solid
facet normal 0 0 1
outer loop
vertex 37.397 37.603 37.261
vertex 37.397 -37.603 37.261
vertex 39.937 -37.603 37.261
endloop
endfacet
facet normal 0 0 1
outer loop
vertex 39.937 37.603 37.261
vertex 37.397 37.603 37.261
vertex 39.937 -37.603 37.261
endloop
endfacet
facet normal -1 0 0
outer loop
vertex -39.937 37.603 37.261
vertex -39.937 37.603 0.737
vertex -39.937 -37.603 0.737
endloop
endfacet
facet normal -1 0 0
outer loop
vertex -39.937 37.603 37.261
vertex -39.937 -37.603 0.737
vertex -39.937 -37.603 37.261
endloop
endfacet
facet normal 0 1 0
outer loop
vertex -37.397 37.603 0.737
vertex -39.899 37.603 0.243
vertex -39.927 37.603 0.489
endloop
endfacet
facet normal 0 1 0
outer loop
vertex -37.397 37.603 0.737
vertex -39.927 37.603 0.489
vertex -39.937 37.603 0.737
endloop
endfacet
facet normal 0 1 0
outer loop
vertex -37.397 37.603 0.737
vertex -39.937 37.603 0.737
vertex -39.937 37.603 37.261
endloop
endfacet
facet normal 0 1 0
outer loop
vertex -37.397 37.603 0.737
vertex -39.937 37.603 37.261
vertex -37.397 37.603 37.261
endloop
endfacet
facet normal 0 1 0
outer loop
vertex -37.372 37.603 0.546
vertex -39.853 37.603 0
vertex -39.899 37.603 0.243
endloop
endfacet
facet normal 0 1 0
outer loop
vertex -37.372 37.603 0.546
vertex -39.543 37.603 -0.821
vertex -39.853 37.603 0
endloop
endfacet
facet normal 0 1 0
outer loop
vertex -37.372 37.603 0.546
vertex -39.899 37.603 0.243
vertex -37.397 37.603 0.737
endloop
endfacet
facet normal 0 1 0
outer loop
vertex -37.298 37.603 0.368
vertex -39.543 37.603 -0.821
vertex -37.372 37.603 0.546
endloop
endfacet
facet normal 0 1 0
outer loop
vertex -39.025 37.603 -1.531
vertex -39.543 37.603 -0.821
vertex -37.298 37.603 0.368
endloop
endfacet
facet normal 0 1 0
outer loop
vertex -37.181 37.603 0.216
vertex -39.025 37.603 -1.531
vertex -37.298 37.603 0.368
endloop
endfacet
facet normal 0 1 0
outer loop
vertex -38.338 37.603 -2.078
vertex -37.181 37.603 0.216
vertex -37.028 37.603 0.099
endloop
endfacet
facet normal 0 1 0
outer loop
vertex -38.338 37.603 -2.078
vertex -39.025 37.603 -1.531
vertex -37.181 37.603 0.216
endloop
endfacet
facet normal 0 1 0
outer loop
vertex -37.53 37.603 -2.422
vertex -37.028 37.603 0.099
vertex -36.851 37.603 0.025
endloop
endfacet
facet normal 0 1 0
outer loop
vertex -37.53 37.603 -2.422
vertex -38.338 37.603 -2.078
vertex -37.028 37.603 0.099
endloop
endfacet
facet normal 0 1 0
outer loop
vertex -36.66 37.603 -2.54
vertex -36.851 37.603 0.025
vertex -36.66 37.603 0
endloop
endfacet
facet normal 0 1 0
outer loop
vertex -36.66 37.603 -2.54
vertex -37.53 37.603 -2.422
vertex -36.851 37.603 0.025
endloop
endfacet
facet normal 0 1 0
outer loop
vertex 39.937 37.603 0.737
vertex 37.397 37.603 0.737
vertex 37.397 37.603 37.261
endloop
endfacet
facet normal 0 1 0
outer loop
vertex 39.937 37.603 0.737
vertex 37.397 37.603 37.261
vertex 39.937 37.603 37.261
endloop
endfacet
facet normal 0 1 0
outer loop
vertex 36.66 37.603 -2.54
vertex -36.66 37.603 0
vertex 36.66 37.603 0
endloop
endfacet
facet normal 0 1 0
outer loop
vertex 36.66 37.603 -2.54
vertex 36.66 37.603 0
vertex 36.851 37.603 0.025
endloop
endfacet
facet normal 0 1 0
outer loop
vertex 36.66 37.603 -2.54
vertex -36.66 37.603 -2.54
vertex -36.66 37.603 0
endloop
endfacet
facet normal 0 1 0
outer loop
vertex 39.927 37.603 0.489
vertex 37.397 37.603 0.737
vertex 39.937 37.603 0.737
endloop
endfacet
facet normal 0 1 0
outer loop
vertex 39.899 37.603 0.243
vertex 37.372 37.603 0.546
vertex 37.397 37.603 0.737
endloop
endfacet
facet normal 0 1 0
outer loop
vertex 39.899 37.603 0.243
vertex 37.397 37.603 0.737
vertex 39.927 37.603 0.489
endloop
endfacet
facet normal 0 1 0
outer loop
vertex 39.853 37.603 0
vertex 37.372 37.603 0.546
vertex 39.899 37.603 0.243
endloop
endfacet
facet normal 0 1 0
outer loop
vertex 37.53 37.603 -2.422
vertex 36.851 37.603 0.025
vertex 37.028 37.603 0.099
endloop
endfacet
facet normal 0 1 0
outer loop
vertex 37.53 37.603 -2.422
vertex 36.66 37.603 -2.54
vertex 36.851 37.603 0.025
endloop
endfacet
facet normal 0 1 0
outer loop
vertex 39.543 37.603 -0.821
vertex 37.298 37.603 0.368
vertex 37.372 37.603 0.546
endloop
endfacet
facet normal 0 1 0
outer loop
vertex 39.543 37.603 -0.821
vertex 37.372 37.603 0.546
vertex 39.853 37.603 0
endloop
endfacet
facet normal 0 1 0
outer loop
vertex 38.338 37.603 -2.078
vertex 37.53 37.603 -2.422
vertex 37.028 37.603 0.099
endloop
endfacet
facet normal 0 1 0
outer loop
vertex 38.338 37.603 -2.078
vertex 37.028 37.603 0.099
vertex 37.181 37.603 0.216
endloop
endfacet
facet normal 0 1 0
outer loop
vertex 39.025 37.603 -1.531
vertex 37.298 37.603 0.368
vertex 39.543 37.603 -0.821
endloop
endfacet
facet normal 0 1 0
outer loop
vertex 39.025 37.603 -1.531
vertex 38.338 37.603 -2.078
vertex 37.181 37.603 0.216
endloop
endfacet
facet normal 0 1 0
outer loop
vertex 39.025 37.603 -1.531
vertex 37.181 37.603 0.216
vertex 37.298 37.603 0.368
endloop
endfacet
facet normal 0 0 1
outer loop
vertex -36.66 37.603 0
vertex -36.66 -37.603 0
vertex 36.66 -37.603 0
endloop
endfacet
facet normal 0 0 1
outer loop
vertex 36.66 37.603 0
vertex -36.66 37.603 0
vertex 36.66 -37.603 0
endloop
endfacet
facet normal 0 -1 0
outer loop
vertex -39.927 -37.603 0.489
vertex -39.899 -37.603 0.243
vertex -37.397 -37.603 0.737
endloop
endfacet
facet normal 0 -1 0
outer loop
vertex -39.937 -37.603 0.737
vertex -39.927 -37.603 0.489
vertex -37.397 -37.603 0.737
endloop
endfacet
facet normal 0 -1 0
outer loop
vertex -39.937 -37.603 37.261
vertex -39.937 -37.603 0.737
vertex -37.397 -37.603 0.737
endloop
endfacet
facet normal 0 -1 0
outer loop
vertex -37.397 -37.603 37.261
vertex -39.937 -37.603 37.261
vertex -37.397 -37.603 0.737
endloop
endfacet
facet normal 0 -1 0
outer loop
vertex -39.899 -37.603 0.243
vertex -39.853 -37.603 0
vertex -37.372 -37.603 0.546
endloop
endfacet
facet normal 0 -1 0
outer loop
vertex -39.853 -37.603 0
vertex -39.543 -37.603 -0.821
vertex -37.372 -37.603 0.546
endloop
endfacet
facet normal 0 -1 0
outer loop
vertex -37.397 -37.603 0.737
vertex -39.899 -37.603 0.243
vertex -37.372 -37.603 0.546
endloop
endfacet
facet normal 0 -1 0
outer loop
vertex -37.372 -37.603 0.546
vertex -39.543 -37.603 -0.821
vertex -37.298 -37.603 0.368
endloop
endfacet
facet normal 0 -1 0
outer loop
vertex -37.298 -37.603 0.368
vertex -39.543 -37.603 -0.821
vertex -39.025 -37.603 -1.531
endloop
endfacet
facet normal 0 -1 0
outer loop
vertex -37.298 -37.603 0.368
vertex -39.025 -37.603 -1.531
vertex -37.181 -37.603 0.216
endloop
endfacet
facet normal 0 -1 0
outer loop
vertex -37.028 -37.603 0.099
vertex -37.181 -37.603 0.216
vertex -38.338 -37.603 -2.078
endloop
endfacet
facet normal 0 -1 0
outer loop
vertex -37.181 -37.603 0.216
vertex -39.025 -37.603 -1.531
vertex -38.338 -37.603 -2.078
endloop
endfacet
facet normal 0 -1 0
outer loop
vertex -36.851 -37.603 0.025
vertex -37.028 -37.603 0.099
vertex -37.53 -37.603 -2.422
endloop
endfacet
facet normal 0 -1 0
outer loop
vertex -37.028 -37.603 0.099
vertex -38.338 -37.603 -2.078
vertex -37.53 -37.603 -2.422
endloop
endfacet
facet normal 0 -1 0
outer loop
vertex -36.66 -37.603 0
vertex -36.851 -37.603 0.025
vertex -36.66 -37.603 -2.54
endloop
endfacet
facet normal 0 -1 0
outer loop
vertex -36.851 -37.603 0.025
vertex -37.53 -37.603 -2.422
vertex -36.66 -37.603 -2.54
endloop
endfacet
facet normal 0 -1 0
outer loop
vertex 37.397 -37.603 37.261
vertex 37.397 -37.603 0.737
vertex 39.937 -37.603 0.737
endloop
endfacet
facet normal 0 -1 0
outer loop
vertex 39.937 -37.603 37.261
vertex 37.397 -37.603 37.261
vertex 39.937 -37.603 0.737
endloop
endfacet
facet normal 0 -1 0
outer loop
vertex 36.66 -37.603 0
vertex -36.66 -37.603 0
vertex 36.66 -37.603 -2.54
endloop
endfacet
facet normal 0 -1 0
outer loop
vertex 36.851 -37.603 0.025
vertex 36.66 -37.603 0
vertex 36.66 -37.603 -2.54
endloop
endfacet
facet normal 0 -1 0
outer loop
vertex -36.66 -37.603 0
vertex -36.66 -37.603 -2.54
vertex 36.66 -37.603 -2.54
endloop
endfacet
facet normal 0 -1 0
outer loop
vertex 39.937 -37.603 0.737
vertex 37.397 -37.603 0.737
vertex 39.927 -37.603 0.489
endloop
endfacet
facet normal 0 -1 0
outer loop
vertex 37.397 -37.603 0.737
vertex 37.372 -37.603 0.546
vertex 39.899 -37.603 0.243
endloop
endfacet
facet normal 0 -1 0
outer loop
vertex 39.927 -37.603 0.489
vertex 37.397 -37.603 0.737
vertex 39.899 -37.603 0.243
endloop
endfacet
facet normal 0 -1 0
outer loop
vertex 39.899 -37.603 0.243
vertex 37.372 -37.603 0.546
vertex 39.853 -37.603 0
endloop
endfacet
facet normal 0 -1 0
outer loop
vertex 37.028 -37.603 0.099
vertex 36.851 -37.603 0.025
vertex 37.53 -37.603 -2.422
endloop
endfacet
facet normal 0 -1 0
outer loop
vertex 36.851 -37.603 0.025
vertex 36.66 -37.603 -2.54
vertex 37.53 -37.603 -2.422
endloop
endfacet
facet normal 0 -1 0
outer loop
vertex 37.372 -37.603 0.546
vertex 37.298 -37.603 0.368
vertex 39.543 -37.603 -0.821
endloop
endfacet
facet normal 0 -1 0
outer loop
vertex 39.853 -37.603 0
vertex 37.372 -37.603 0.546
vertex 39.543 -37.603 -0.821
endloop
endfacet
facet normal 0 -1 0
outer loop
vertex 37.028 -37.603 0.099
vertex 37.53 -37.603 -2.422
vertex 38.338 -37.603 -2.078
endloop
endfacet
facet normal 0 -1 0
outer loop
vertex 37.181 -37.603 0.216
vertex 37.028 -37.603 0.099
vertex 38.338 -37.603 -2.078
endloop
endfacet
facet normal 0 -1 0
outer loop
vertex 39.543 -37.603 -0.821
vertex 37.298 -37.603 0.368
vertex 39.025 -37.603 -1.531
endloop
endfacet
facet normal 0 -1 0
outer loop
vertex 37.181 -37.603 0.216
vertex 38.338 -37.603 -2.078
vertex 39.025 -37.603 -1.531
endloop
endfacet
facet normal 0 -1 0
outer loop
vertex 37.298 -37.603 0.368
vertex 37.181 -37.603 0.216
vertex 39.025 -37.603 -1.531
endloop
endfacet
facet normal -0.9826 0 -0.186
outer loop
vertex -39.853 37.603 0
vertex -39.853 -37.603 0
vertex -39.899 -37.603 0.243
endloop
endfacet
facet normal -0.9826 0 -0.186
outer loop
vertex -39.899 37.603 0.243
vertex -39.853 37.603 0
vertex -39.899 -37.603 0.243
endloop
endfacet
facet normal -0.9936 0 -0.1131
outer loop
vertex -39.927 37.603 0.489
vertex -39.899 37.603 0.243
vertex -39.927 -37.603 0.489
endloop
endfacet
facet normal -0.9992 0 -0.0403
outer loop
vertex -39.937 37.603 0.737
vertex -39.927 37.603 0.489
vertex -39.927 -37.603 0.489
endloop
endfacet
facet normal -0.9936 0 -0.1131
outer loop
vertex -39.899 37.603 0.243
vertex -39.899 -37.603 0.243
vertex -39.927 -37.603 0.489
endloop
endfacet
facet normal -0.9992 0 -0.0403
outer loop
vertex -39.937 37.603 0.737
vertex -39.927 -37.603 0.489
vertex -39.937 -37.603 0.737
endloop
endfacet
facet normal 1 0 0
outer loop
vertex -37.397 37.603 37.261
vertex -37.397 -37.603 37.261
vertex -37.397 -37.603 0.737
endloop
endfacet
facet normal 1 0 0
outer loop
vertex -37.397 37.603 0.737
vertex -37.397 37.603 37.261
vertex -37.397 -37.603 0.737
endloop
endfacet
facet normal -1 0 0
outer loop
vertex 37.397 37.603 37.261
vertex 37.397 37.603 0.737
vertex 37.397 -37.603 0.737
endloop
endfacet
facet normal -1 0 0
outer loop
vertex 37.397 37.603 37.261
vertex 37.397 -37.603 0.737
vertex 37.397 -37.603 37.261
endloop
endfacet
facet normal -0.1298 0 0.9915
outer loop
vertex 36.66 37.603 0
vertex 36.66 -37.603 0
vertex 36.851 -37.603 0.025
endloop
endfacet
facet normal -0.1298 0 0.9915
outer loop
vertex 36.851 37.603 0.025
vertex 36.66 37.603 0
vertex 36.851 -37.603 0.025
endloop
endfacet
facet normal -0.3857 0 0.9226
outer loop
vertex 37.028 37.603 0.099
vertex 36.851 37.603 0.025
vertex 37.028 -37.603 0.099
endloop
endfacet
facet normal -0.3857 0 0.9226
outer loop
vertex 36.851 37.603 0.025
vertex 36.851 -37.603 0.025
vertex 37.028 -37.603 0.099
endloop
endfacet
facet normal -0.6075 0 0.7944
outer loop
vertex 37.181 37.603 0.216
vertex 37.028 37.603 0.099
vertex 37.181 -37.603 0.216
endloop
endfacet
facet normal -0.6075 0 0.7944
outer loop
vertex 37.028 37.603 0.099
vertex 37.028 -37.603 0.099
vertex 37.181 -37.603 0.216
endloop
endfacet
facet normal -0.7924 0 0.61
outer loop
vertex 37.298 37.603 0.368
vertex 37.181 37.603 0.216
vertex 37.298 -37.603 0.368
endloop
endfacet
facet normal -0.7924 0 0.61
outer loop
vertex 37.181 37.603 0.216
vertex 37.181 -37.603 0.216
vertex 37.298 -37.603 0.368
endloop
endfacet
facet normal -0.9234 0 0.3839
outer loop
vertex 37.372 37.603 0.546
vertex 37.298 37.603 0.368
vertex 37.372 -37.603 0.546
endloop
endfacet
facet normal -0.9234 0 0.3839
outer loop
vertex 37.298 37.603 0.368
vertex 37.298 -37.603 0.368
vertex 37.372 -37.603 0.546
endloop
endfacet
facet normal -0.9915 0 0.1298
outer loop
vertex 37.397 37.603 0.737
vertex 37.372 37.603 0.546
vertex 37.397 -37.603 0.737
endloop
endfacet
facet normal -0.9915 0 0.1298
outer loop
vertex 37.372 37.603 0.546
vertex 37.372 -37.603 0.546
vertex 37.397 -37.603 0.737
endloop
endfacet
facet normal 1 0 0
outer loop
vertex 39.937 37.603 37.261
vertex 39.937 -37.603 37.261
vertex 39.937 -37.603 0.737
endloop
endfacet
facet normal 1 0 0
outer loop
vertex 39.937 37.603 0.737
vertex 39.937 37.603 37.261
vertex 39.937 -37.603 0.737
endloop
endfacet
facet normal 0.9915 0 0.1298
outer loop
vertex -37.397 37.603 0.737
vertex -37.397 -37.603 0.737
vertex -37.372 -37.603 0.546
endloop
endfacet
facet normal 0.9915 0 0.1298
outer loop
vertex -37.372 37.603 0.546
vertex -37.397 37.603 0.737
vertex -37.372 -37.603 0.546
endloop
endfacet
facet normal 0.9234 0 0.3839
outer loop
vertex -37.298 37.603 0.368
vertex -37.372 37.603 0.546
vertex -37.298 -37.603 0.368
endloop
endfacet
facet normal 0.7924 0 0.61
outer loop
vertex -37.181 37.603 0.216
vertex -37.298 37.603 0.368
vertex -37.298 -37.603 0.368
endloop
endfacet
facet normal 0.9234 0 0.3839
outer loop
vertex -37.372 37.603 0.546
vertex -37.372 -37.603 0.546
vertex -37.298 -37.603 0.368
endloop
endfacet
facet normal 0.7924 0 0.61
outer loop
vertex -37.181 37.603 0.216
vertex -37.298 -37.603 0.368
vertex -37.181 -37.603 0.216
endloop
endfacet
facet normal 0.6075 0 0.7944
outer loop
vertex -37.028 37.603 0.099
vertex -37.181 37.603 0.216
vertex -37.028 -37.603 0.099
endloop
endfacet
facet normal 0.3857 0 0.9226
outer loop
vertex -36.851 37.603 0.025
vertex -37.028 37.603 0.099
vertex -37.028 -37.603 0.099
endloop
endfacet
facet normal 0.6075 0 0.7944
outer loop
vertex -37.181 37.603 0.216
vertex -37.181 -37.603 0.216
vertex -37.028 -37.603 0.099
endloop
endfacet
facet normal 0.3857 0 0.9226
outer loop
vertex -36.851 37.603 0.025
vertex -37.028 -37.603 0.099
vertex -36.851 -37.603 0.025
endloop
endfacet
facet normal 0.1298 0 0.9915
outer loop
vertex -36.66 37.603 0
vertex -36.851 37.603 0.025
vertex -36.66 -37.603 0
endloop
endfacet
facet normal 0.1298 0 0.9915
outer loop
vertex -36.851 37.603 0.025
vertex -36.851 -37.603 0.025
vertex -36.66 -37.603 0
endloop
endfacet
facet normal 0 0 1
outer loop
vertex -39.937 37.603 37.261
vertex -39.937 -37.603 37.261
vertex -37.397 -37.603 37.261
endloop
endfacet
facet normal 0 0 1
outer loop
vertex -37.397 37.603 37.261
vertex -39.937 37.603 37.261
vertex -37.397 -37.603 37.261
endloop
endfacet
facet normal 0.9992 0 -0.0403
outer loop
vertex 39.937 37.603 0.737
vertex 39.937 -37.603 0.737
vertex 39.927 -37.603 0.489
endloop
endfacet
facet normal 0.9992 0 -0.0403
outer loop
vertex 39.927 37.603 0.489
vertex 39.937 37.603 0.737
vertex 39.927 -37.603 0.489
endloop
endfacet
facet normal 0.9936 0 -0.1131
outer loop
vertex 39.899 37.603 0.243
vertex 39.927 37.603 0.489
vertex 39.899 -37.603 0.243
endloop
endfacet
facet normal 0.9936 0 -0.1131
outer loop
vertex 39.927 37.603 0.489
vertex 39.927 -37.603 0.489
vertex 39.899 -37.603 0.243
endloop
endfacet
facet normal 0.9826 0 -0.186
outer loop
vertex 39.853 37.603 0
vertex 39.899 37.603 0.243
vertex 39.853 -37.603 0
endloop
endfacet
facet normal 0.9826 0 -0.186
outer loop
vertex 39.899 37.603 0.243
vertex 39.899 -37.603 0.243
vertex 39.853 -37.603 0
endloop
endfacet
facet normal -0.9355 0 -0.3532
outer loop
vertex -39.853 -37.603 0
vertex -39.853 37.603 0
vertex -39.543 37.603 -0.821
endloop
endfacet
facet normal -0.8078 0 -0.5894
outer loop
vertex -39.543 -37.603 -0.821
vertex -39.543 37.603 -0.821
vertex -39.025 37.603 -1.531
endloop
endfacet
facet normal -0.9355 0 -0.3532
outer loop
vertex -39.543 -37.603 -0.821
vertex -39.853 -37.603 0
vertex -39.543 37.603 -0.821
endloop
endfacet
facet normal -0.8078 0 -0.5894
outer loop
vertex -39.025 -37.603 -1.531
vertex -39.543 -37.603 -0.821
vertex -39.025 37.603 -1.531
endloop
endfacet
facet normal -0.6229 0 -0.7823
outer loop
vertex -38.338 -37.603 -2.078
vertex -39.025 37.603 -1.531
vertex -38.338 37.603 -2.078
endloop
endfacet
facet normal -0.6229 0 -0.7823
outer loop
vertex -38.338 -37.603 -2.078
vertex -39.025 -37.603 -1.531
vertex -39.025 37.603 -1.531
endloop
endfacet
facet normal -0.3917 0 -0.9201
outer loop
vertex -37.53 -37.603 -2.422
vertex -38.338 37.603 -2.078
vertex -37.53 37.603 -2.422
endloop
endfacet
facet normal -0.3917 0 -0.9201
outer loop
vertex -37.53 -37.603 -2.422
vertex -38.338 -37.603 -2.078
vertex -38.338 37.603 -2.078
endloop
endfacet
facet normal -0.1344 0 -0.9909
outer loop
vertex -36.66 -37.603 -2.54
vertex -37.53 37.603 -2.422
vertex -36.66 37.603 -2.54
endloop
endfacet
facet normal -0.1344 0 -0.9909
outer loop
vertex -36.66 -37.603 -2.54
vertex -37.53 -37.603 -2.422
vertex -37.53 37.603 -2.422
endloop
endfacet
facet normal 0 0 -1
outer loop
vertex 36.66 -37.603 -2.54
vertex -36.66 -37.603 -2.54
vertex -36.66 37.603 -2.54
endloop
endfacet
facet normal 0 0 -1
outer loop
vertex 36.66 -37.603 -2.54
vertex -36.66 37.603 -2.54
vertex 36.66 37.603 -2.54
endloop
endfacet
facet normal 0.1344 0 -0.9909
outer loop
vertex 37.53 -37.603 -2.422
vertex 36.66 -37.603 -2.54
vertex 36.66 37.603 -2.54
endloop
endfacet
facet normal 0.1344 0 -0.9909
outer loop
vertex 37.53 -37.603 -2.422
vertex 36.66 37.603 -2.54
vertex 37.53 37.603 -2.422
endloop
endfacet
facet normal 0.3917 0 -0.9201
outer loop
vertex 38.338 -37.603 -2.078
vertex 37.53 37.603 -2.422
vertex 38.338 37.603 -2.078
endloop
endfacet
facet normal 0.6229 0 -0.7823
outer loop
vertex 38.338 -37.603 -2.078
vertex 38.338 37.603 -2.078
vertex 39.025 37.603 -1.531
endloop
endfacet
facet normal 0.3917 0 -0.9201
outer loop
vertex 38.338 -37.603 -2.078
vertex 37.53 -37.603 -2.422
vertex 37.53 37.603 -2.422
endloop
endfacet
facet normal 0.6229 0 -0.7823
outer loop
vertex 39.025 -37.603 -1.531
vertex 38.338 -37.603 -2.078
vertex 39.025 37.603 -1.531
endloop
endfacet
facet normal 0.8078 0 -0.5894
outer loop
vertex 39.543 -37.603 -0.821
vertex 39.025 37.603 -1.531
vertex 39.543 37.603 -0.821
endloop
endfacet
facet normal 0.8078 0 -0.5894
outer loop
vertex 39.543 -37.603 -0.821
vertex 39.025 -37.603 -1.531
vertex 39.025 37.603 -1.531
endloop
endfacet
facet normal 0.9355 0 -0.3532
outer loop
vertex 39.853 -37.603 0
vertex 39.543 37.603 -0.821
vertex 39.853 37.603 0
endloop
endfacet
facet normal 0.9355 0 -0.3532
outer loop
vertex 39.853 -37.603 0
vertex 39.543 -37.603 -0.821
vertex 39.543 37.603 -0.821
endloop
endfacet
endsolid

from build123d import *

# Parameters (mm, degrees)
SKETCH1_W              = 152.672175124
SKETCH1_H              = 75.20671235
BASE_FLANGE1_DEPTH     = 2.54
SKETCHED_START         = -37.603356175
SKETCHED_BEND1_DEPTH   = 75.20671235
SKETCHED_BEND1_2_DEPTH = 75.20671235


# Read off the part's stored shape, not the designer's step: Sketched Bend1
# Sheet-metal steps are written as plain solids
with BuildPart() as part:
    # Sketch1 → Base-Flange1 (new body)
    with BuildSketch(Plane.XY):
        Rectangle(SKETCH1_W, SKETCH1_H)
    extrude(amount=-BASE_FLANGE1_DEPTH)

    # Sketched Bend1 outline → Sketched Bend1 (cut)
    with BuildSketch(Plane(origin=(0, 0, 0), x_dir=(1, 0, 0), z_dir=(0, 1, 0)).offset(SKETCHED_START)):
        with BuildLine():
            ThreePointArc((-39.8528381, 0), (-38.700029664, 1.827542266), (-36.660107607, 2.54))
            Line((-36.660107607, 2.54), (-76.336087562, 2.54))
            Line((-76.336087562, 2.54), (-76.336087562, 0))
            Line((-76.336087562, 0), (-39.8528381, 0))
        make_face()
        with BuildLine():
            Line((76.336087562, 2.54), (36.660107607, 2.54))
            ThreePointArc((36.660107607, 2.54), (38.700029664, 1.827542266), (39.8528381, 0))
            Line((39.8528381, 0), (76.336087562, 0))
            Line((76.336087562, 0), (76.336087562, 2.54))
        make_face()
    extrude(amount=SKETCHED_BEND1_DEPTH, mode=Mode.SUBTRACT)

    # Sketched Bend1 2 outline → Sketched Bend1 2 (add)
    with BuildSketch(Plane(origin=(0, 0, 0), x_dir=(1, 0, 0), z_dir=(0, 1, 0)).offset(SKETCHED_START)):
        with BuildLine():
            Line((-36.660107607, 0), (-39.8528381, 0))
            ThreePointArc((-39.8528381, 0), (-39.915672711, -0.365920336), (-39.936707607, -0.7366))
            Line((-39.936707607, -0.7366), (-39.936707607, -37.260620045))
            Line((-39.936707607, -37.260620045), (-37.396707607, -37.260620045))
            Line((-37.396707607, -37.260620045), (-37.396707607, -0.7366))
            ThreePointArc((-37.396707607, -0.7366), (-37.180962462, -0.215745145), (-36.660107607, 0))
        make_face()
        with BuildLine():
            ThreePointArc((39.936707607, -0.7366), (39.915672711, -0.365920336), (39.8528381, 0))
            Line((39.8528381, 0), (36.660107607, 0))
            ThreePointArc((36.660107607, 0), (37.180962462, -0.215745145), (37.396707607, -0.7366))
            Line((37.396707607, -0.7366), (37.396707607, -37.260620045))
            Line((37.396707607, -37.260620045), (39.936707607, -37.260620045))
            Line((39.936707607, -37.260620045), (39.936707607, -0.7366))
        make_face()
    extrude(amount=SKETCHED_BEND1_2_DEPTH)


solid = part.part
